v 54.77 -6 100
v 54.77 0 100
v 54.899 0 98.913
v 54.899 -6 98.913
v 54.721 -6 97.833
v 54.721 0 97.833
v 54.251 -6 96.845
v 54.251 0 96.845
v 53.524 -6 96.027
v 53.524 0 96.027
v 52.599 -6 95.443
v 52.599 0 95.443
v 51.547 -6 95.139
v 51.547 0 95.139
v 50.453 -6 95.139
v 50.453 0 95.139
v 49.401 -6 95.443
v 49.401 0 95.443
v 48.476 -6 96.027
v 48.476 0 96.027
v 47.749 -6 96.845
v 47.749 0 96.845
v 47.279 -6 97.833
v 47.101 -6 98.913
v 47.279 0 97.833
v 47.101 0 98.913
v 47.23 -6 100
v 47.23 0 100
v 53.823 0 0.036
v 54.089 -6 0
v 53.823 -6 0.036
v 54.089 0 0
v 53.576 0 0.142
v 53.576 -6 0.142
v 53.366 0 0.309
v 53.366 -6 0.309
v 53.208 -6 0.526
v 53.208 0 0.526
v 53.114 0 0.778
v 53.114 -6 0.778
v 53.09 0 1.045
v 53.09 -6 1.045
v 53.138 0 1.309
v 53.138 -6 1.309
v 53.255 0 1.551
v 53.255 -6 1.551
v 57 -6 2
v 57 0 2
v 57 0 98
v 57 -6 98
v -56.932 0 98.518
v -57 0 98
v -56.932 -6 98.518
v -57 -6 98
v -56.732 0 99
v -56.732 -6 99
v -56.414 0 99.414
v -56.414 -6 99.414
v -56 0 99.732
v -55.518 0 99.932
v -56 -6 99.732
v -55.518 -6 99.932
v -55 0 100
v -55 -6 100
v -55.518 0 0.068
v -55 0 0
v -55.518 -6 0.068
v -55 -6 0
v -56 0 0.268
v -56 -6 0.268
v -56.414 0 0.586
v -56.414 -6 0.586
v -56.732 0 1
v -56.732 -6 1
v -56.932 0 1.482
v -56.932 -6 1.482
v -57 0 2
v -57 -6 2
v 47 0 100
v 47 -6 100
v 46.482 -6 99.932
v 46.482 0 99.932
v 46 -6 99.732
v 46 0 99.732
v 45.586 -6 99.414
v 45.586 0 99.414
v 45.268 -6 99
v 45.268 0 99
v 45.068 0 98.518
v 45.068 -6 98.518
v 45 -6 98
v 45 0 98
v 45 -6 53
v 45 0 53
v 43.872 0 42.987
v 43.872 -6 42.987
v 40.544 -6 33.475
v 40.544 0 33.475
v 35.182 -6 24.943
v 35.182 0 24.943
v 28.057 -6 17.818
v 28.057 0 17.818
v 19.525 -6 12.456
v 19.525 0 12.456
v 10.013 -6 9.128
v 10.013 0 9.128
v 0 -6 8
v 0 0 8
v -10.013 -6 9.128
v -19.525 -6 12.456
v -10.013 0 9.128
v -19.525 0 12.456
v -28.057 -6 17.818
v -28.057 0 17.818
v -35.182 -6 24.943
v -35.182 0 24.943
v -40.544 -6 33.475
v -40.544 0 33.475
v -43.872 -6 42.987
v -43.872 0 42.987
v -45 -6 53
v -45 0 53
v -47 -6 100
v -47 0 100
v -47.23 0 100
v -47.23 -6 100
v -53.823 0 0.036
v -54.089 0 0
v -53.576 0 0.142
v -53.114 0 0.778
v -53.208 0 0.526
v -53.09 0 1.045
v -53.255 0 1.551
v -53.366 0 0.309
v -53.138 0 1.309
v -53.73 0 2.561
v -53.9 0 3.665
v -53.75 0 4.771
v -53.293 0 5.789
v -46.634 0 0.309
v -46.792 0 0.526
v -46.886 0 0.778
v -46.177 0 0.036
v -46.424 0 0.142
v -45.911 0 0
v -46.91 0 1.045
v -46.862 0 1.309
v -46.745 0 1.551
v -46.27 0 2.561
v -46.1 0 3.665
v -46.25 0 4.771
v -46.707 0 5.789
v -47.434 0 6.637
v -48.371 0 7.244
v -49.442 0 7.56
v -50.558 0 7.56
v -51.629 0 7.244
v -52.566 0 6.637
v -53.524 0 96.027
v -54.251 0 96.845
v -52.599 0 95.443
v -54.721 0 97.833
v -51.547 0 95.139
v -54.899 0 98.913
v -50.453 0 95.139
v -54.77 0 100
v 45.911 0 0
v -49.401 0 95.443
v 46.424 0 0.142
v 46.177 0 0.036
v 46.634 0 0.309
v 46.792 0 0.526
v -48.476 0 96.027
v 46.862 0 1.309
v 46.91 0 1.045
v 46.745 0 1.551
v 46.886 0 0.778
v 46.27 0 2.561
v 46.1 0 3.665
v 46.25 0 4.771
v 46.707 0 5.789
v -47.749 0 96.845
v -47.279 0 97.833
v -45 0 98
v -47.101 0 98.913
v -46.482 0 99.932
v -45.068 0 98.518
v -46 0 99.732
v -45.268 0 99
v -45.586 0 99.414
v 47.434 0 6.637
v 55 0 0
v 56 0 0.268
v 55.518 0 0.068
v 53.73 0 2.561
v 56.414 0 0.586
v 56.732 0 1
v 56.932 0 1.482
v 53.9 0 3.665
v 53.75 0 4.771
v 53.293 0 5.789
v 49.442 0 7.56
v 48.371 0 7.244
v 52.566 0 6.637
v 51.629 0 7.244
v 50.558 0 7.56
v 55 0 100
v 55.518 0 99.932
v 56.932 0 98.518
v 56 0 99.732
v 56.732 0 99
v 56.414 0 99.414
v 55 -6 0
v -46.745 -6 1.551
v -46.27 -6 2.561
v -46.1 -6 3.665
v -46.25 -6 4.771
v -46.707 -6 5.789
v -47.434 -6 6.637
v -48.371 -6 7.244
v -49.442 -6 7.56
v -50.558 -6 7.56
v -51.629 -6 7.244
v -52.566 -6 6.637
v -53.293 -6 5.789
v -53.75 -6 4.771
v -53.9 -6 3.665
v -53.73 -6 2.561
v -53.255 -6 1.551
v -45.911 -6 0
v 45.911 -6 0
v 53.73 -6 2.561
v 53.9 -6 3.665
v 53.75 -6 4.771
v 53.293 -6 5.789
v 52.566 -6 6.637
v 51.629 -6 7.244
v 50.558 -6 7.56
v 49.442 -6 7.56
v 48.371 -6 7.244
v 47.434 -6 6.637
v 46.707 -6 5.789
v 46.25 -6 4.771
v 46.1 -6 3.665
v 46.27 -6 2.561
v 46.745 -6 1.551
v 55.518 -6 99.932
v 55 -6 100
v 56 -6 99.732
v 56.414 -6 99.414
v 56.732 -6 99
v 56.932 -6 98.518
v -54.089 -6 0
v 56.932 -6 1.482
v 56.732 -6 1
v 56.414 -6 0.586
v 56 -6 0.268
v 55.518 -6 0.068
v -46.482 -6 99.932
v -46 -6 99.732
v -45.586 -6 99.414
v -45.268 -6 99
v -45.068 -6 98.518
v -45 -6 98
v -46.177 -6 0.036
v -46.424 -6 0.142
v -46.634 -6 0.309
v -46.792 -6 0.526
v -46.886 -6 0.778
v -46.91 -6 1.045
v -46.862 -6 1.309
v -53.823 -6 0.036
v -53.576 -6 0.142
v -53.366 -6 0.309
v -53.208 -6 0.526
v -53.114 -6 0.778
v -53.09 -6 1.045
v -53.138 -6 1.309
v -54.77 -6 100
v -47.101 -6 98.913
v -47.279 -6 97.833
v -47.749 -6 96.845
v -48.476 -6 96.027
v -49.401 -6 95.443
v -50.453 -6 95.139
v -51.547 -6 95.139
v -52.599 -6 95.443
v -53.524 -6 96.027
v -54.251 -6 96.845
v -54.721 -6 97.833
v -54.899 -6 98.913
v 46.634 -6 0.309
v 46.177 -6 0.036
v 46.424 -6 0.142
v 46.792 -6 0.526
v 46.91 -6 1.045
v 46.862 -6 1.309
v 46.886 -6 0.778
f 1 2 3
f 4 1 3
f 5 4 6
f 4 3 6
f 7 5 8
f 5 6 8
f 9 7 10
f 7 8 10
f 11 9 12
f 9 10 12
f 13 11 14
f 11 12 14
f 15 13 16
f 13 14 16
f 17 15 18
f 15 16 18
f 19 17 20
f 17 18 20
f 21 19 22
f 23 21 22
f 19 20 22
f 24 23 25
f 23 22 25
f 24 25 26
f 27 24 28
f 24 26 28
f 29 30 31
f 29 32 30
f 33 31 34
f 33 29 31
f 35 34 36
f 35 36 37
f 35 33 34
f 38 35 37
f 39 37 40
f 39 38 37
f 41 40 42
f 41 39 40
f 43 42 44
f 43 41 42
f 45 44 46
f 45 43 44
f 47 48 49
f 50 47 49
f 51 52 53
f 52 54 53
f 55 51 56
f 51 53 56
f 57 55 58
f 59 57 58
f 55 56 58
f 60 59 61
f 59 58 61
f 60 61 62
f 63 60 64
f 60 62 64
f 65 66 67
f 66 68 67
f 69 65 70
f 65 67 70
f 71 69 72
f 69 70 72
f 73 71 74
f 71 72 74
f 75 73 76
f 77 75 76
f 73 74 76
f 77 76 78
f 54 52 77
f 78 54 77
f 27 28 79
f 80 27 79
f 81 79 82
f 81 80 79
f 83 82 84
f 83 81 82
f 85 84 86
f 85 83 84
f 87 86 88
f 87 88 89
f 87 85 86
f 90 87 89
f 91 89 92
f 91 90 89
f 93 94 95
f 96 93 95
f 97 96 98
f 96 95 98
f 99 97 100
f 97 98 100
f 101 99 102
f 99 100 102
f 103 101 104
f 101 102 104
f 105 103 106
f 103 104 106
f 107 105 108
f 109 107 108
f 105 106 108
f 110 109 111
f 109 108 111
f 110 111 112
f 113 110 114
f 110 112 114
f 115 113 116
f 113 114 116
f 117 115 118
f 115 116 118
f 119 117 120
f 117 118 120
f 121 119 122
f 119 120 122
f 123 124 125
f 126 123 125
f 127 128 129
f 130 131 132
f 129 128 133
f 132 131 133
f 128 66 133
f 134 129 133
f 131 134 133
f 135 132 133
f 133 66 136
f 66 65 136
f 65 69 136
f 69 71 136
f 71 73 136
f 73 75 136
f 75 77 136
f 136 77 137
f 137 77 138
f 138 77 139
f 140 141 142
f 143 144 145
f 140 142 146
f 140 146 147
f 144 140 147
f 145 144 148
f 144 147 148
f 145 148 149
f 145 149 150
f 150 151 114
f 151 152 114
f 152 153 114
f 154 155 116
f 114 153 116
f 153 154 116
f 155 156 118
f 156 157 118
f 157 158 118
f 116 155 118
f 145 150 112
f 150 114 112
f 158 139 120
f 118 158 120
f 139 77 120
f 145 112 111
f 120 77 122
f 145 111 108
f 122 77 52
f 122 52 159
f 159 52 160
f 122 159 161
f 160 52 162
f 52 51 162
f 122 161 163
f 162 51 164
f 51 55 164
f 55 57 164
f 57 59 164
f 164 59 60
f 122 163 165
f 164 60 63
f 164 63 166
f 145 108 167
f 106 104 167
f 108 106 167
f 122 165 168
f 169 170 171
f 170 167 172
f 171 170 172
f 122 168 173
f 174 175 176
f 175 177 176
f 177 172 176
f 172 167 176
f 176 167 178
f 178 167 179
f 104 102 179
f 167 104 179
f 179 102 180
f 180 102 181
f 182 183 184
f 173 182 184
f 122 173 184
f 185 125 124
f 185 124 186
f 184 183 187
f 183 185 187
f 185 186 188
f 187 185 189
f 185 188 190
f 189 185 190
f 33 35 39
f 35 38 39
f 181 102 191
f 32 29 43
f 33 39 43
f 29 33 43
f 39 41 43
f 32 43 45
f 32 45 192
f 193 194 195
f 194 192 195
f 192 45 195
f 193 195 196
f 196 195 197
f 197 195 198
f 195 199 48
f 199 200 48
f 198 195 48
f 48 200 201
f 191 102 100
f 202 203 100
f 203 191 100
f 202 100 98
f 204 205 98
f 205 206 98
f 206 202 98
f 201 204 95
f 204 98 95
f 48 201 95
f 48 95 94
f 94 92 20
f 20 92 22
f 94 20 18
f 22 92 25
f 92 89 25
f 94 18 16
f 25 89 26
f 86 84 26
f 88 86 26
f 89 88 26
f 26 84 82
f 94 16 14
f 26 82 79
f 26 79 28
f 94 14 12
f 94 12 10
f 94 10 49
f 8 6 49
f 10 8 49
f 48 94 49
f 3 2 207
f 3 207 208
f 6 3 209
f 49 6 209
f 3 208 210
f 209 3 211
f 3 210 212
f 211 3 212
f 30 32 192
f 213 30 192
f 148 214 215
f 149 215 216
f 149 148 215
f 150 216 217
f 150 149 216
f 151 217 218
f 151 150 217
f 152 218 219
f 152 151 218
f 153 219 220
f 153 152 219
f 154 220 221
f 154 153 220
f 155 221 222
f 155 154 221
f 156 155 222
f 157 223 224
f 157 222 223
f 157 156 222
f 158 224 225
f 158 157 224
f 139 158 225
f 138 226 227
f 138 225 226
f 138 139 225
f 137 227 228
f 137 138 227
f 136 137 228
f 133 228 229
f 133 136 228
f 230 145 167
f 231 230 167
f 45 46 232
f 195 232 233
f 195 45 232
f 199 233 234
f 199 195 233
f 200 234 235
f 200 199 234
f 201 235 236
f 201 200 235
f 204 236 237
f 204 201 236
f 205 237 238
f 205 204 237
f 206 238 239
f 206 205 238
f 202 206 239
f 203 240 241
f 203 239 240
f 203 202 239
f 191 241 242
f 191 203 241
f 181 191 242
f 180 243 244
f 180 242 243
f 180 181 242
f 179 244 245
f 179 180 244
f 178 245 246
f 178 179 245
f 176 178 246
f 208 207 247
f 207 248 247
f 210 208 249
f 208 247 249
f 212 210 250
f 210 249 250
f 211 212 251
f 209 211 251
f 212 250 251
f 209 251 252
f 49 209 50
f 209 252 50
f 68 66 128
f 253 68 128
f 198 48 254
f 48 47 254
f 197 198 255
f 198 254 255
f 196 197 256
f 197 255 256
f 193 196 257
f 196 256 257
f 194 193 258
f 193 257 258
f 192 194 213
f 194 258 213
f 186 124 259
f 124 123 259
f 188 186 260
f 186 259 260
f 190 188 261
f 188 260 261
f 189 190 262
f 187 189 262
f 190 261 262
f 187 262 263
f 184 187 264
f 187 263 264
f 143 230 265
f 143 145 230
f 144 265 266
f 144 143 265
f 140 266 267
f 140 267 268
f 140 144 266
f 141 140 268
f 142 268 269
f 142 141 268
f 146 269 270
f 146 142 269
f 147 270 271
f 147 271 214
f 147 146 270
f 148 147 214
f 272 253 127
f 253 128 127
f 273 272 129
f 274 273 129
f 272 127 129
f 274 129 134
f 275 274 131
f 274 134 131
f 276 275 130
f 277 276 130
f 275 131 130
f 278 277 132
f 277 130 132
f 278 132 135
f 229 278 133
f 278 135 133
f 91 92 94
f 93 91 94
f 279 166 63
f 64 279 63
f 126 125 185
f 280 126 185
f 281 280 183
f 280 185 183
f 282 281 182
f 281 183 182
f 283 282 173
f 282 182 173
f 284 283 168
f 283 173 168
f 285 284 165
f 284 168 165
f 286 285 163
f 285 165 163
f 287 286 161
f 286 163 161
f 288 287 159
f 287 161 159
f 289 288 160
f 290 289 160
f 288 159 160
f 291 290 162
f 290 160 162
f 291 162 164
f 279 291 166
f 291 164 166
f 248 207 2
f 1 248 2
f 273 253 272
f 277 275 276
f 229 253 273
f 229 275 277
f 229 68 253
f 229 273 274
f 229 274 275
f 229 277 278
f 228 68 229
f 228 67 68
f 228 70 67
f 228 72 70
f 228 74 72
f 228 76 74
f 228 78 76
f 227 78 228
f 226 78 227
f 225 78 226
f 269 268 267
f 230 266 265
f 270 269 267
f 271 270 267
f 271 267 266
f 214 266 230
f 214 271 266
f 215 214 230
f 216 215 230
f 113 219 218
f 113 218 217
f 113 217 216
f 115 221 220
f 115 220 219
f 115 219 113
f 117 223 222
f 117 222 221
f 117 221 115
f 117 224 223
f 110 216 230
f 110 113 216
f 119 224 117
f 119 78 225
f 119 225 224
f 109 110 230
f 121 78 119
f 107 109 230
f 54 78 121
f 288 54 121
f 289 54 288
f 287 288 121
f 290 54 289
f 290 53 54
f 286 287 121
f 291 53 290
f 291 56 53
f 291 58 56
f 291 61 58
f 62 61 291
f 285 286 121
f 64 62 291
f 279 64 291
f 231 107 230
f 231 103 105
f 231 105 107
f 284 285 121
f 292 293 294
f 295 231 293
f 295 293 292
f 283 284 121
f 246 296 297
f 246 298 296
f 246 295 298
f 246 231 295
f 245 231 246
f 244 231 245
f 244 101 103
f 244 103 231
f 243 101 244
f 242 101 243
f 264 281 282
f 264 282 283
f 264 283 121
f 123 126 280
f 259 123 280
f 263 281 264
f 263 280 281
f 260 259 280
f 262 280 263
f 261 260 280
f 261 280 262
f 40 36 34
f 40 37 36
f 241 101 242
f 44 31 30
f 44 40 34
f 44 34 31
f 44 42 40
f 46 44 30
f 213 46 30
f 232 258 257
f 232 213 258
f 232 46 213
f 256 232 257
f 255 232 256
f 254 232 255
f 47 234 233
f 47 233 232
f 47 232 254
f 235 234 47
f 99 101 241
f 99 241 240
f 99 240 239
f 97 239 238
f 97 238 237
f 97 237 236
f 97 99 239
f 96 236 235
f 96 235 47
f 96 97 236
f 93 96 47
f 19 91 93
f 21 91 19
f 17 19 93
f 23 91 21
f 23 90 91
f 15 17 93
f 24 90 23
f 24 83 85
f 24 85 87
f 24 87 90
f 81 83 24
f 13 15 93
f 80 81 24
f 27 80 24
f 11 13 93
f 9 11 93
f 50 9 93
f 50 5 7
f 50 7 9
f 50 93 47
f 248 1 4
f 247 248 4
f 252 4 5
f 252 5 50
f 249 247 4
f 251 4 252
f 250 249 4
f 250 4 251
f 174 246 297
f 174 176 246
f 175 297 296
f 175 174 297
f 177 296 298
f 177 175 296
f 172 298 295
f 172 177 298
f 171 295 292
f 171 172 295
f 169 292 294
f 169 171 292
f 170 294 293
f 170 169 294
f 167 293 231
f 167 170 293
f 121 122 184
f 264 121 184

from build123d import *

# Parameters (mm, degrees)
F1_DEPTH = 6
F2_R     = 3.9
F3_DEPTH = 6.001
F4_R     = 2
F5_R     = 1


with BuildPart() as f1:
    # F0 (on Front) → F1 (new body)
    with BuildSketch(Plane.XZ):
        with BuildLine():
            ThreePointArc((45, 53), (0, 8), (-45, 53))
            Line((-45, 53), (-45, 100))
            Line((-45, 100), (-47.230384635, 100))
            ThreePointArc((-47.230384635, 100), (-51, 95.1), (-54.769615365, 100))
            Line((-54.769615365, 100), (-57, 100))
            Line((-57, 100), (-57, 0))
            Line((-57, 0), (57, 0))
            Line((57, 0), (57, 100))
            Line((57, 100), (54.769615365, 100))
            ThreePointArc((54.769615365, 100), (51, 95.1), (47.230384635, 100))
            Line((47.230384635, 100), (45, 100))
            Line((45, 100), (45, 53))
        make_face()
    extrude(amount=F1_DEPTH)

    # F2 (on Front) → F3 (cut, through all)
    with BuildSketch(Plane.XZ):
        with Locations((-50, 3.7)):
            Circle(F2_R)
        with Locations((50, 3.7)):
            Circle(F2_R)
    extrude(amount=F3_DEPTH, mode=Mode.SUBTRACT)

    # F4
    f4_edges = [f1.edges().sort_by_distance(p)[0] for p in [
        (-45, -3, 100),
        (45, -3, 100),
        (-57, -3, 100),
        (57, -3, 100),
        (57, -3, 0),
        (-57, -3, 0),
    ]]
    fillet(f4_edges, radius=F4_R)

    # F5
    f5_edges = [f1.edges().sort_by_distance(p)[0] for p in [
        (-48.767117, -3, 0),
        (-51.232883, -3, 0),
        (51.232883, -3, 0),
        (48.767117, -3, 0),
    ]]
    fillet(f5_edges, radius=F5_R)


solid = f1.part
